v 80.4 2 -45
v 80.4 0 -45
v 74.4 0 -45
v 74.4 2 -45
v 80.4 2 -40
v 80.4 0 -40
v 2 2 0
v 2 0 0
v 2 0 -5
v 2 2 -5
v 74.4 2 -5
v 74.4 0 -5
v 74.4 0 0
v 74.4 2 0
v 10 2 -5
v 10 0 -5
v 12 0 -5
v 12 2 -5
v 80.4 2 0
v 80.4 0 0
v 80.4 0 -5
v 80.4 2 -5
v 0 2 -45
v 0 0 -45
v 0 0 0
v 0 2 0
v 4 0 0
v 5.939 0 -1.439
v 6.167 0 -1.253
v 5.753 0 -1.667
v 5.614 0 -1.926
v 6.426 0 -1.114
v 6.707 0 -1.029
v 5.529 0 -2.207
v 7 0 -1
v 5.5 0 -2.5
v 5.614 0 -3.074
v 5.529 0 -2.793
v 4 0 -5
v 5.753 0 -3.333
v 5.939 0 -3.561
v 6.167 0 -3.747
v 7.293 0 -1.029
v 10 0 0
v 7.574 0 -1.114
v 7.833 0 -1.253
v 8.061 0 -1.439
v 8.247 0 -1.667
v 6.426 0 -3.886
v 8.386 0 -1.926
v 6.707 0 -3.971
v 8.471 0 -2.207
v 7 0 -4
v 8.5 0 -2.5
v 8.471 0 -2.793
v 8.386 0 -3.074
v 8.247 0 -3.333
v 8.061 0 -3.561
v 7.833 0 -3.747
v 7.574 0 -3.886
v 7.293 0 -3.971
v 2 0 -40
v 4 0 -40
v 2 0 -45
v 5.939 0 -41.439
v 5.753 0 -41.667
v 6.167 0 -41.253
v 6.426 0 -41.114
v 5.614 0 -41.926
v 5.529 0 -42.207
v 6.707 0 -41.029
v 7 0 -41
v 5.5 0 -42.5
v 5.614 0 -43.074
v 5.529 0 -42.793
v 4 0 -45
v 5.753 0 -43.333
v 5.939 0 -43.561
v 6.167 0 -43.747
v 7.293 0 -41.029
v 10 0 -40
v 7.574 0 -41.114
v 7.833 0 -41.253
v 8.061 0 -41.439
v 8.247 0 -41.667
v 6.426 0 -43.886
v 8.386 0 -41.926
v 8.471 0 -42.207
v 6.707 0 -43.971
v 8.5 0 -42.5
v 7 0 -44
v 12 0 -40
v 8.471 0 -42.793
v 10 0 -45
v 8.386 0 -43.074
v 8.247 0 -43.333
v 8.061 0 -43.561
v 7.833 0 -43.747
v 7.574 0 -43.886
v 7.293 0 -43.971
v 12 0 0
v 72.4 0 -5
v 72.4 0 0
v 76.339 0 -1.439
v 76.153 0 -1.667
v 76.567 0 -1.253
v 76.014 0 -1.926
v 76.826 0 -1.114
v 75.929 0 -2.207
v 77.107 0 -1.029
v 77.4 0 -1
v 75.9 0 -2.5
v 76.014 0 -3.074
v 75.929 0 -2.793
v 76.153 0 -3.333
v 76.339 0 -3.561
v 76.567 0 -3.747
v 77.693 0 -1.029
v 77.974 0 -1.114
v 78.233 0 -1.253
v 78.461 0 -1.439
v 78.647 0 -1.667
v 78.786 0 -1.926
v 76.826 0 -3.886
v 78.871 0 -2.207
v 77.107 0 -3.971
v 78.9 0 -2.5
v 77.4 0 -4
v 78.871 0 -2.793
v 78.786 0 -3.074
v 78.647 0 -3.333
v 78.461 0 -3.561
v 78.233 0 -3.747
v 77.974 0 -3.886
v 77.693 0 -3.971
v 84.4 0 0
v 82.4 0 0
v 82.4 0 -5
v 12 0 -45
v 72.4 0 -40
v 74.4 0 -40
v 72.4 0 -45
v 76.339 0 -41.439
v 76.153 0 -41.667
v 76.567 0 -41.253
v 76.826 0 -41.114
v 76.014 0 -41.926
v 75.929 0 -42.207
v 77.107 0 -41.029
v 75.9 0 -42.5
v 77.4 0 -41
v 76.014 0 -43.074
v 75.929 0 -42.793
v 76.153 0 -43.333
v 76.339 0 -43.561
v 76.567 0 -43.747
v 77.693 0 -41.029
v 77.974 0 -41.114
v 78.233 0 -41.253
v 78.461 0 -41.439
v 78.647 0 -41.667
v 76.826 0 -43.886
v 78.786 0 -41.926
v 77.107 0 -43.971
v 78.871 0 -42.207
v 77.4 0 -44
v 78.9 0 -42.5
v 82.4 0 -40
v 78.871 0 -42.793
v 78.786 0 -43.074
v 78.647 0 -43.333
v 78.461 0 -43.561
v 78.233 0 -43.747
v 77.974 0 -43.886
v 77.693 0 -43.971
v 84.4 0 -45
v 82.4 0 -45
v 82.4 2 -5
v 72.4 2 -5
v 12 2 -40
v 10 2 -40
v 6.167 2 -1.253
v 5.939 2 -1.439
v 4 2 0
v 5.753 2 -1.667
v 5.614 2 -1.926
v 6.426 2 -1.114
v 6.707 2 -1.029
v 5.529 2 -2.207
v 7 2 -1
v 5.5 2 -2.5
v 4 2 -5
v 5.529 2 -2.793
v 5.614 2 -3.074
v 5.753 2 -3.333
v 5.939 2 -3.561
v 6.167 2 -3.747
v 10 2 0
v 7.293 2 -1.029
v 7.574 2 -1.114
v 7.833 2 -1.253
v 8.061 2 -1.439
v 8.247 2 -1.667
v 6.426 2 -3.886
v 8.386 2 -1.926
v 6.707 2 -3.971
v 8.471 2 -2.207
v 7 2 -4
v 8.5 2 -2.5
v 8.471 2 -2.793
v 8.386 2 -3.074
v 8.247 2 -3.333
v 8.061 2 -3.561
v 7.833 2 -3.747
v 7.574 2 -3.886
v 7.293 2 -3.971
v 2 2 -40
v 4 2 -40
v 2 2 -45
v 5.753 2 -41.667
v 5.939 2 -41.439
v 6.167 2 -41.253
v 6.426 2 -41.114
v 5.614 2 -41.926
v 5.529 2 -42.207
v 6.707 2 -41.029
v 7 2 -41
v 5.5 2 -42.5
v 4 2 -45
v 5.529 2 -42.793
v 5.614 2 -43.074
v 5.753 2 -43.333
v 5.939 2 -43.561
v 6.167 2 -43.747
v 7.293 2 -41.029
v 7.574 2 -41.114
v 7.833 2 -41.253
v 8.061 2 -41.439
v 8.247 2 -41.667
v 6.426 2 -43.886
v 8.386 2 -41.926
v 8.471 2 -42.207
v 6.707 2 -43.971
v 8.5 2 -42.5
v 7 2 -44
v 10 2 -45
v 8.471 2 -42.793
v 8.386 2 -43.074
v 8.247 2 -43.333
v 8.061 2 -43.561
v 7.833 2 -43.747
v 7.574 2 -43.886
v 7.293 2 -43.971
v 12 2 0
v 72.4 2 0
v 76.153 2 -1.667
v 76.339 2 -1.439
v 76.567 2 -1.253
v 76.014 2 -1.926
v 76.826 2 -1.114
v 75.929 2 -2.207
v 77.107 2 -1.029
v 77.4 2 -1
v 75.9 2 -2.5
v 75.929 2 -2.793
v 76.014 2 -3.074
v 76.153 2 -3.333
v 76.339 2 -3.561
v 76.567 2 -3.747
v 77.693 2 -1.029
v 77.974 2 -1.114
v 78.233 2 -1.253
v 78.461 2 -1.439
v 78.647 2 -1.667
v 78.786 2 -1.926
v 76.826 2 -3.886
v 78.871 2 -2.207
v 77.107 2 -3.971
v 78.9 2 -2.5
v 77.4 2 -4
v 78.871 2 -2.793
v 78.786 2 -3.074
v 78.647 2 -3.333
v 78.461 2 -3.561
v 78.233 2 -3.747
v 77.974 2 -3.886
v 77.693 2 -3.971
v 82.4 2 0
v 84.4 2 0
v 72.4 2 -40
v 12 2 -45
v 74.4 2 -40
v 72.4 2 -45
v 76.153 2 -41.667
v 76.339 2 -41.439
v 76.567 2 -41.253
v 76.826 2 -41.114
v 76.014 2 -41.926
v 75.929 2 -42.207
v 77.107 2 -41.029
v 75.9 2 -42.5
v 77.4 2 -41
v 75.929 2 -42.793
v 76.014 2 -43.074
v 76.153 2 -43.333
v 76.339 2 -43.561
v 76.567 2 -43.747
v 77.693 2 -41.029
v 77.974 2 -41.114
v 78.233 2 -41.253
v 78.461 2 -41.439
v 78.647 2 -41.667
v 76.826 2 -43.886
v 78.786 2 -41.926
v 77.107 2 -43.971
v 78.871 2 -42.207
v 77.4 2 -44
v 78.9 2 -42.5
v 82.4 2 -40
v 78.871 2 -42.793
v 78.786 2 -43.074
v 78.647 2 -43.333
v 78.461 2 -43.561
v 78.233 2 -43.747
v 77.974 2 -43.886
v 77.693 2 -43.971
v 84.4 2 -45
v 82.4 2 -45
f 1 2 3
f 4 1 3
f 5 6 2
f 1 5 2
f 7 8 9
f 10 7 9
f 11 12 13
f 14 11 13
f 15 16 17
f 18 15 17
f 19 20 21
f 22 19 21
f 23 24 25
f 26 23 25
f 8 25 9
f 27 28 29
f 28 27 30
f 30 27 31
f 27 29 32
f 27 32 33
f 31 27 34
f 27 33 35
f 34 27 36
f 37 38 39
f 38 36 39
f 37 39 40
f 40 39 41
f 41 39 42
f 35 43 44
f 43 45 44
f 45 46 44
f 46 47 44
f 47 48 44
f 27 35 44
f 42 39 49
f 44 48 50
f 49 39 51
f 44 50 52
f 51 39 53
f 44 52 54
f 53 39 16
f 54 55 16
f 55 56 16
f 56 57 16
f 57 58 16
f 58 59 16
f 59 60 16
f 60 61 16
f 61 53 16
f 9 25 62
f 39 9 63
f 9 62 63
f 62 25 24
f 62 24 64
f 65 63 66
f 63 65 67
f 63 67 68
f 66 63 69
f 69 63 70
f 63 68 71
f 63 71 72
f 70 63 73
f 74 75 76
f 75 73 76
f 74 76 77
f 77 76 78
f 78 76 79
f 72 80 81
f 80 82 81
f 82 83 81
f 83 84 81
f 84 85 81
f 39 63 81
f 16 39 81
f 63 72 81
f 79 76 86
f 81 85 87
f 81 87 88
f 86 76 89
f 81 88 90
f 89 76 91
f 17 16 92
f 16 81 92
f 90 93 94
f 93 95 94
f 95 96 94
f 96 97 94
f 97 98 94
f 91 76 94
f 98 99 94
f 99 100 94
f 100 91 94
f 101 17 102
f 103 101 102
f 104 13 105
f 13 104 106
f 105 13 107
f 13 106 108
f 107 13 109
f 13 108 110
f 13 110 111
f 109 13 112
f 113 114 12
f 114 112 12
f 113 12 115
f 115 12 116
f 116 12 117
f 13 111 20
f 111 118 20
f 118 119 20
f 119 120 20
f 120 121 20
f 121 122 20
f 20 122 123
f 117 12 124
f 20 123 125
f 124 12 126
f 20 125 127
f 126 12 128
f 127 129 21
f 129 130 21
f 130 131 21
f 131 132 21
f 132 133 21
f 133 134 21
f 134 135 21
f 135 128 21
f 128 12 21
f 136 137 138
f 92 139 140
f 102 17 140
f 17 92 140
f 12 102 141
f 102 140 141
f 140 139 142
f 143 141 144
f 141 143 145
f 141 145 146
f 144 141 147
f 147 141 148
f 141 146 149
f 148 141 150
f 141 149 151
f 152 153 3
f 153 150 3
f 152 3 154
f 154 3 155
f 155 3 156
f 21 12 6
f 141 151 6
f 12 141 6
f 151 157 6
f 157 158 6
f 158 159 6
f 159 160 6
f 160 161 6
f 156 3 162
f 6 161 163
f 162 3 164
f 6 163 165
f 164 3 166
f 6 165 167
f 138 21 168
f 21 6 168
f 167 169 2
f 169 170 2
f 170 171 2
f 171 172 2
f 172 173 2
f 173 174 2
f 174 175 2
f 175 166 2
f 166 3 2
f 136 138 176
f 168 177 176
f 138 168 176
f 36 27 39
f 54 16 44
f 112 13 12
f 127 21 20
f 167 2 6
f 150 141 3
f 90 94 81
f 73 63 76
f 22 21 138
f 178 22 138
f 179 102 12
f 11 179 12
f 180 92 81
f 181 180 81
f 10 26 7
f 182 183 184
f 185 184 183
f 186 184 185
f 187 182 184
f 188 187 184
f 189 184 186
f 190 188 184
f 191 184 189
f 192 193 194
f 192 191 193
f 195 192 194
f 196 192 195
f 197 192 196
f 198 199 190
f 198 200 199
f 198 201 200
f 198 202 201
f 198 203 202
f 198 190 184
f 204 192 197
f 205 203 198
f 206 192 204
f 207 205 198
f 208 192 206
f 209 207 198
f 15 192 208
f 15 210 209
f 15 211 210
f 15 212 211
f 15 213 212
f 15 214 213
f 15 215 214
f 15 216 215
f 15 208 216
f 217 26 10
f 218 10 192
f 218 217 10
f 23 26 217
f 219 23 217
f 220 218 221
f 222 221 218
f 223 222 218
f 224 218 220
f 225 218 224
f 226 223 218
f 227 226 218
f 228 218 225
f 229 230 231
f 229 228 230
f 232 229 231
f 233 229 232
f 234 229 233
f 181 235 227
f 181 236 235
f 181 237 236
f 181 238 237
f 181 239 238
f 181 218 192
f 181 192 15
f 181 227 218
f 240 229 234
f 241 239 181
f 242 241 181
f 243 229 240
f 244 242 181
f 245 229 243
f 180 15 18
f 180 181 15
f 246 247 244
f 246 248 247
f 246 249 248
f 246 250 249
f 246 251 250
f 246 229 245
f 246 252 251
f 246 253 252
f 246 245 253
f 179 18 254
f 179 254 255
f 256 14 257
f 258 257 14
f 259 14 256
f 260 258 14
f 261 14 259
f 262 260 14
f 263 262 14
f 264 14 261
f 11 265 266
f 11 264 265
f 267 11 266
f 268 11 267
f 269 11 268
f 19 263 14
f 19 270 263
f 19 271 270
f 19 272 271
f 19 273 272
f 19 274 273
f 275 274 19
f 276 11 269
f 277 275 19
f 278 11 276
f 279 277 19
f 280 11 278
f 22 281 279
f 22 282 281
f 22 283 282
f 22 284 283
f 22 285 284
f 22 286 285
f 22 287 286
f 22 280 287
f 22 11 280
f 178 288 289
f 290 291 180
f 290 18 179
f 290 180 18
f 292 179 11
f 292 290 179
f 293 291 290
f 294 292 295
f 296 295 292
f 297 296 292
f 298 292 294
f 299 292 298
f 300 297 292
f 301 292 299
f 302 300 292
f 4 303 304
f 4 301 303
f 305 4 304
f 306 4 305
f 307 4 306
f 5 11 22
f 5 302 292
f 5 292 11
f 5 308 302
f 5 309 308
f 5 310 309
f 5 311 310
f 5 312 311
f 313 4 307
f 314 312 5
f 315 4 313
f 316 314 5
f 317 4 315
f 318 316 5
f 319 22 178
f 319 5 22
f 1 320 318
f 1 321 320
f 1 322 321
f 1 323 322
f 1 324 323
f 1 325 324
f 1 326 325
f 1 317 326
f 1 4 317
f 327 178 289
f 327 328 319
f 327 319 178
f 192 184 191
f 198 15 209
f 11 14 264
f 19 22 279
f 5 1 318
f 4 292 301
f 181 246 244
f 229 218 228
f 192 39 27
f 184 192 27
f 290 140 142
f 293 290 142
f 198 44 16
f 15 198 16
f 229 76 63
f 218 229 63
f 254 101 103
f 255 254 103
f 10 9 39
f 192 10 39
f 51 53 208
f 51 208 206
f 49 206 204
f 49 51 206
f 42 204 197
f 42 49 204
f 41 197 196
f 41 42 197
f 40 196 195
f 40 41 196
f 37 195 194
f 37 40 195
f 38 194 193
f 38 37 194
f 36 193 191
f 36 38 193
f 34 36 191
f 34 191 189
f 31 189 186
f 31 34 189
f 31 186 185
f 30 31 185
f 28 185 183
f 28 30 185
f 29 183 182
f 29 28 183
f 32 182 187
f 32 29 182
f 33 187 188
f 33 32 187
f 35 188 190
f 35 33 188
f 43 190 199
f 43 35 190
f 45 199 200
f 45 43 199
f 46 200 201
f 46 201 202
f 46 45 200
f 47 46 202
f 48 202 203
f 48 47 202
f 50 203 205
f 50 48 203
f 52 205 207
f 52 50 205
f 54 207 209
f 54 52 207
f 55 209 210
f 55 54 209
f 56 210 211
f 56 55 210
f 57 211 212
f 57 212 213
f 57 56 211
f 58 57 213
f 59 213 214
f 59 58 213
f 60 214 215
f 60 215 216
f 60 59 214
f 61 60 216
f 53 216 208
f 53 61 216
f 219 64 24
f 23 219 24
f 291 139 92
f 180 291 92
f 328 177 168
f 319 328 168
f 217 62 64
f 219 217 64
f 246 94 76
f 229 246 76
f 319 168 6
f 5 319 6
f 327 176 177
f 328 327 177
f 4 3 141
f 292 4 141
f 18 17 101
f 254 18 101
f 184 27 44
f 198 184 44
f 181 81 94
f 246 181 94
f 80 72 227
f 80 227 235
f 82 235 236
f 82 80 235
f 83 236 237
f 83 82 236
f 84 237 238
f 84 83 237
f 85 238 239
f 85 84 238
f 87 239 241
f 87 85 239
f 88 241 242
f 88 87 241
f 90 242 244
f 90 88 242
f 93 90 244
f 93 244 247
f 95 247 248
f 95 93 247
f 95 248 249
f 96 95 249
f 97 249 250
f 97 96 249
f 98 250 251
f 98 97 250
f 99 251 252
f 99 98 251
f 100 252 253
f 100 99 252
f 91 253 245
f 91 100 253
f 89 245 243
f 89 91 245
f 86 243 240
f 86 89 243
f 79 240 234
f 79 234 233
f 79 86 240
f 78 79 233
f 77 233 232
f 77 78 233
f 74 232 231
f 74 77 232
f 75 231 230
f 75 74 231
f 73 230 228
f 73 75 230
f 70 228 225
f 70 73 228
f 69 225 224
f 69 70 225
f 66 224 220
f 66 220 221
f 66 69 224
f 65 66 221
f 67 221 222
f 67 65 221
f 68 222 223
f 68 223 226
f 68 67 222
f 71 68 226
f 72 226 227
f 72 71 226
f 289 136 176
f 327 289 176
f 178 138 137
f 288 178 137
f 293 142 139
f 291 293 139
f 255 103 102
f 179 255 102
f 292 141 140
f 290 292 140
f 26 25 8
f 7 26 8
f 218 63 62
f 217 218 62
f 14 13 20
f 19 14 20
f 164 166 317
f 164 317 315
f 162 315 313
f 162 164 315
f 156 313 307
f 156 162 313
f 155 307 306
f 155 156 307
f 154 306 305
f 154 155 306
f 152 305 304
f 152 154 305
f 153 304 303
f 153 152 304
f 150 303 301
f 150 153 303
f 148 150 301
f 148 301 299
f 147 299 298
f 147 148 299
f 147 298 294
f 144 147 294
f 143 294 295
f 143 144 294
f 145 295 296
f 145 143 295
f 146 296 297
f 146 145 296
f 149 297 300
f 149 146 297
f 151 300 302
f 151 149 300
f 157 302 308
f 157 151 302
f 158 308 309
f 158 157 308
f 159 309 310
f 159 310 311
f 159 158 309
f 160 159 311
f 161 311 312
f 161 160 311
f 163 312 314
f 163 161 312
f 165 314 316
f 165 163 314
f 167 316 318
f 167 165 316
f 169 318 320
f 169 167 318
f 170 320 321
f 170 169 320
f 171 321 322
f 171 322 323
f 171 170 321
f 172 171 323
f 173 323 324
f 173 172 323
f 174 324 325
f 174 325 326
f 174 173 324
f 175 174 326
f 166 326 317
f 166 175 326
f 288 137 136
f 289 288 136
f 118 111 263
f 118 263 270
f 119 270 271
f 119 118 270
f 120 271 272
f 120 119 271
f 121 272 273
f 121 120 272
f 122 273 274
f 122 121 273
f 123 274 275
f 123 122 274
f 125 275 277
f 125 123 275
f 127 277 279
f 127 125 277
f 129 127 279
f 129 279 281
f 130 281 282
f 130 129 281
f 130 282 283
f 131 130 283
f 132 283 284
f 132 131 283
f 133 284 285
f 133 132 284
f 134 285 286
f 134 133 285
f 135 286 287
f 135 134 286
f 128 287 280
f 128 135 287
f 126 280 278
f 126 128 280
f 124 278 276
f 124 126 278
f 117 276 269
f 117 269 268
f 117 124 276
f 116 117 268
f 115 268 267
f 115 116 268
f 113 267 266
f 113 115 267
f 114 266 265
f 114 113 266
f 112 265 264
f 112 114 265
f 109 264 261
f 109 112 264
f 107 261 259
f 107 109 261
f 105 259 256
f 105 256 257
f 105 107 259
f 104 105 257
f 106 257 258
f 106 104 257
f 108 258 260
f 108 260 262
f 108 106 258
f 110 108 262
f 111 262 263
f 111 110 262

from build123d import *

# Parameters (mm, degrees)
SKETCH1_R           = 1.5
BOSS_EXTRUDE1_DEPTH = 2


with BuildPart() as part:
    # Sketch1 → Boss-Extrude1 (new body)
    with BuildSketch(Plane(origin=(0, 0, 0), x_dir=(1, 0, 0), z_dir=(0, 1, 0))):
        Polygon((0, 0), (2, 0), (2, 5), (4, 5), (4, 0), (10, 0), (10, 5), (12, 5), (12, 0), (72.4, 0), (72.4, 5), (74.4, 5), (74.4, 0), (80.4, 0), (80.4, 5), (82.4, 5), (82.4, 0), (84.4, 0), (84.4, 45), (82.4, 45), (82.4, 40), (80.4, 40), (80.4, 45), (74.4, 45), (74.4, 40), (72.4, 40), (72.4, 45), (12, 45), (12, 40), (10, 40), (10, 45), (4, 45), (4, 40), (2, 40), (2, 45), (0, 45), align=None)
        with Locations(Location((7, 42.5, 0), (0, 0, 270))):
            Circle(SKETCH1_R, mode=Mode.SUBTRACT)
        with Locations(Location((77.4, 42.5, 0), (0, 0, 90))):
            Circle(SKETCH1_R, mode=Mode.SUBTRACT)
        with Locations(Location((7, 2.5, 0), (0, 0, 90))):
            Circle(SKETCH1_R, mode=Mode.SUBTRACT)
        with Locations(Location((77.4, 2.5, 0), (0, 0, 270))):
            Circle(SKETCH1_R, mode=Mode.SUBTRACT)
    extrude(amount=BOSS_EXTRUDE1_DEPTH)


solid = part.part
